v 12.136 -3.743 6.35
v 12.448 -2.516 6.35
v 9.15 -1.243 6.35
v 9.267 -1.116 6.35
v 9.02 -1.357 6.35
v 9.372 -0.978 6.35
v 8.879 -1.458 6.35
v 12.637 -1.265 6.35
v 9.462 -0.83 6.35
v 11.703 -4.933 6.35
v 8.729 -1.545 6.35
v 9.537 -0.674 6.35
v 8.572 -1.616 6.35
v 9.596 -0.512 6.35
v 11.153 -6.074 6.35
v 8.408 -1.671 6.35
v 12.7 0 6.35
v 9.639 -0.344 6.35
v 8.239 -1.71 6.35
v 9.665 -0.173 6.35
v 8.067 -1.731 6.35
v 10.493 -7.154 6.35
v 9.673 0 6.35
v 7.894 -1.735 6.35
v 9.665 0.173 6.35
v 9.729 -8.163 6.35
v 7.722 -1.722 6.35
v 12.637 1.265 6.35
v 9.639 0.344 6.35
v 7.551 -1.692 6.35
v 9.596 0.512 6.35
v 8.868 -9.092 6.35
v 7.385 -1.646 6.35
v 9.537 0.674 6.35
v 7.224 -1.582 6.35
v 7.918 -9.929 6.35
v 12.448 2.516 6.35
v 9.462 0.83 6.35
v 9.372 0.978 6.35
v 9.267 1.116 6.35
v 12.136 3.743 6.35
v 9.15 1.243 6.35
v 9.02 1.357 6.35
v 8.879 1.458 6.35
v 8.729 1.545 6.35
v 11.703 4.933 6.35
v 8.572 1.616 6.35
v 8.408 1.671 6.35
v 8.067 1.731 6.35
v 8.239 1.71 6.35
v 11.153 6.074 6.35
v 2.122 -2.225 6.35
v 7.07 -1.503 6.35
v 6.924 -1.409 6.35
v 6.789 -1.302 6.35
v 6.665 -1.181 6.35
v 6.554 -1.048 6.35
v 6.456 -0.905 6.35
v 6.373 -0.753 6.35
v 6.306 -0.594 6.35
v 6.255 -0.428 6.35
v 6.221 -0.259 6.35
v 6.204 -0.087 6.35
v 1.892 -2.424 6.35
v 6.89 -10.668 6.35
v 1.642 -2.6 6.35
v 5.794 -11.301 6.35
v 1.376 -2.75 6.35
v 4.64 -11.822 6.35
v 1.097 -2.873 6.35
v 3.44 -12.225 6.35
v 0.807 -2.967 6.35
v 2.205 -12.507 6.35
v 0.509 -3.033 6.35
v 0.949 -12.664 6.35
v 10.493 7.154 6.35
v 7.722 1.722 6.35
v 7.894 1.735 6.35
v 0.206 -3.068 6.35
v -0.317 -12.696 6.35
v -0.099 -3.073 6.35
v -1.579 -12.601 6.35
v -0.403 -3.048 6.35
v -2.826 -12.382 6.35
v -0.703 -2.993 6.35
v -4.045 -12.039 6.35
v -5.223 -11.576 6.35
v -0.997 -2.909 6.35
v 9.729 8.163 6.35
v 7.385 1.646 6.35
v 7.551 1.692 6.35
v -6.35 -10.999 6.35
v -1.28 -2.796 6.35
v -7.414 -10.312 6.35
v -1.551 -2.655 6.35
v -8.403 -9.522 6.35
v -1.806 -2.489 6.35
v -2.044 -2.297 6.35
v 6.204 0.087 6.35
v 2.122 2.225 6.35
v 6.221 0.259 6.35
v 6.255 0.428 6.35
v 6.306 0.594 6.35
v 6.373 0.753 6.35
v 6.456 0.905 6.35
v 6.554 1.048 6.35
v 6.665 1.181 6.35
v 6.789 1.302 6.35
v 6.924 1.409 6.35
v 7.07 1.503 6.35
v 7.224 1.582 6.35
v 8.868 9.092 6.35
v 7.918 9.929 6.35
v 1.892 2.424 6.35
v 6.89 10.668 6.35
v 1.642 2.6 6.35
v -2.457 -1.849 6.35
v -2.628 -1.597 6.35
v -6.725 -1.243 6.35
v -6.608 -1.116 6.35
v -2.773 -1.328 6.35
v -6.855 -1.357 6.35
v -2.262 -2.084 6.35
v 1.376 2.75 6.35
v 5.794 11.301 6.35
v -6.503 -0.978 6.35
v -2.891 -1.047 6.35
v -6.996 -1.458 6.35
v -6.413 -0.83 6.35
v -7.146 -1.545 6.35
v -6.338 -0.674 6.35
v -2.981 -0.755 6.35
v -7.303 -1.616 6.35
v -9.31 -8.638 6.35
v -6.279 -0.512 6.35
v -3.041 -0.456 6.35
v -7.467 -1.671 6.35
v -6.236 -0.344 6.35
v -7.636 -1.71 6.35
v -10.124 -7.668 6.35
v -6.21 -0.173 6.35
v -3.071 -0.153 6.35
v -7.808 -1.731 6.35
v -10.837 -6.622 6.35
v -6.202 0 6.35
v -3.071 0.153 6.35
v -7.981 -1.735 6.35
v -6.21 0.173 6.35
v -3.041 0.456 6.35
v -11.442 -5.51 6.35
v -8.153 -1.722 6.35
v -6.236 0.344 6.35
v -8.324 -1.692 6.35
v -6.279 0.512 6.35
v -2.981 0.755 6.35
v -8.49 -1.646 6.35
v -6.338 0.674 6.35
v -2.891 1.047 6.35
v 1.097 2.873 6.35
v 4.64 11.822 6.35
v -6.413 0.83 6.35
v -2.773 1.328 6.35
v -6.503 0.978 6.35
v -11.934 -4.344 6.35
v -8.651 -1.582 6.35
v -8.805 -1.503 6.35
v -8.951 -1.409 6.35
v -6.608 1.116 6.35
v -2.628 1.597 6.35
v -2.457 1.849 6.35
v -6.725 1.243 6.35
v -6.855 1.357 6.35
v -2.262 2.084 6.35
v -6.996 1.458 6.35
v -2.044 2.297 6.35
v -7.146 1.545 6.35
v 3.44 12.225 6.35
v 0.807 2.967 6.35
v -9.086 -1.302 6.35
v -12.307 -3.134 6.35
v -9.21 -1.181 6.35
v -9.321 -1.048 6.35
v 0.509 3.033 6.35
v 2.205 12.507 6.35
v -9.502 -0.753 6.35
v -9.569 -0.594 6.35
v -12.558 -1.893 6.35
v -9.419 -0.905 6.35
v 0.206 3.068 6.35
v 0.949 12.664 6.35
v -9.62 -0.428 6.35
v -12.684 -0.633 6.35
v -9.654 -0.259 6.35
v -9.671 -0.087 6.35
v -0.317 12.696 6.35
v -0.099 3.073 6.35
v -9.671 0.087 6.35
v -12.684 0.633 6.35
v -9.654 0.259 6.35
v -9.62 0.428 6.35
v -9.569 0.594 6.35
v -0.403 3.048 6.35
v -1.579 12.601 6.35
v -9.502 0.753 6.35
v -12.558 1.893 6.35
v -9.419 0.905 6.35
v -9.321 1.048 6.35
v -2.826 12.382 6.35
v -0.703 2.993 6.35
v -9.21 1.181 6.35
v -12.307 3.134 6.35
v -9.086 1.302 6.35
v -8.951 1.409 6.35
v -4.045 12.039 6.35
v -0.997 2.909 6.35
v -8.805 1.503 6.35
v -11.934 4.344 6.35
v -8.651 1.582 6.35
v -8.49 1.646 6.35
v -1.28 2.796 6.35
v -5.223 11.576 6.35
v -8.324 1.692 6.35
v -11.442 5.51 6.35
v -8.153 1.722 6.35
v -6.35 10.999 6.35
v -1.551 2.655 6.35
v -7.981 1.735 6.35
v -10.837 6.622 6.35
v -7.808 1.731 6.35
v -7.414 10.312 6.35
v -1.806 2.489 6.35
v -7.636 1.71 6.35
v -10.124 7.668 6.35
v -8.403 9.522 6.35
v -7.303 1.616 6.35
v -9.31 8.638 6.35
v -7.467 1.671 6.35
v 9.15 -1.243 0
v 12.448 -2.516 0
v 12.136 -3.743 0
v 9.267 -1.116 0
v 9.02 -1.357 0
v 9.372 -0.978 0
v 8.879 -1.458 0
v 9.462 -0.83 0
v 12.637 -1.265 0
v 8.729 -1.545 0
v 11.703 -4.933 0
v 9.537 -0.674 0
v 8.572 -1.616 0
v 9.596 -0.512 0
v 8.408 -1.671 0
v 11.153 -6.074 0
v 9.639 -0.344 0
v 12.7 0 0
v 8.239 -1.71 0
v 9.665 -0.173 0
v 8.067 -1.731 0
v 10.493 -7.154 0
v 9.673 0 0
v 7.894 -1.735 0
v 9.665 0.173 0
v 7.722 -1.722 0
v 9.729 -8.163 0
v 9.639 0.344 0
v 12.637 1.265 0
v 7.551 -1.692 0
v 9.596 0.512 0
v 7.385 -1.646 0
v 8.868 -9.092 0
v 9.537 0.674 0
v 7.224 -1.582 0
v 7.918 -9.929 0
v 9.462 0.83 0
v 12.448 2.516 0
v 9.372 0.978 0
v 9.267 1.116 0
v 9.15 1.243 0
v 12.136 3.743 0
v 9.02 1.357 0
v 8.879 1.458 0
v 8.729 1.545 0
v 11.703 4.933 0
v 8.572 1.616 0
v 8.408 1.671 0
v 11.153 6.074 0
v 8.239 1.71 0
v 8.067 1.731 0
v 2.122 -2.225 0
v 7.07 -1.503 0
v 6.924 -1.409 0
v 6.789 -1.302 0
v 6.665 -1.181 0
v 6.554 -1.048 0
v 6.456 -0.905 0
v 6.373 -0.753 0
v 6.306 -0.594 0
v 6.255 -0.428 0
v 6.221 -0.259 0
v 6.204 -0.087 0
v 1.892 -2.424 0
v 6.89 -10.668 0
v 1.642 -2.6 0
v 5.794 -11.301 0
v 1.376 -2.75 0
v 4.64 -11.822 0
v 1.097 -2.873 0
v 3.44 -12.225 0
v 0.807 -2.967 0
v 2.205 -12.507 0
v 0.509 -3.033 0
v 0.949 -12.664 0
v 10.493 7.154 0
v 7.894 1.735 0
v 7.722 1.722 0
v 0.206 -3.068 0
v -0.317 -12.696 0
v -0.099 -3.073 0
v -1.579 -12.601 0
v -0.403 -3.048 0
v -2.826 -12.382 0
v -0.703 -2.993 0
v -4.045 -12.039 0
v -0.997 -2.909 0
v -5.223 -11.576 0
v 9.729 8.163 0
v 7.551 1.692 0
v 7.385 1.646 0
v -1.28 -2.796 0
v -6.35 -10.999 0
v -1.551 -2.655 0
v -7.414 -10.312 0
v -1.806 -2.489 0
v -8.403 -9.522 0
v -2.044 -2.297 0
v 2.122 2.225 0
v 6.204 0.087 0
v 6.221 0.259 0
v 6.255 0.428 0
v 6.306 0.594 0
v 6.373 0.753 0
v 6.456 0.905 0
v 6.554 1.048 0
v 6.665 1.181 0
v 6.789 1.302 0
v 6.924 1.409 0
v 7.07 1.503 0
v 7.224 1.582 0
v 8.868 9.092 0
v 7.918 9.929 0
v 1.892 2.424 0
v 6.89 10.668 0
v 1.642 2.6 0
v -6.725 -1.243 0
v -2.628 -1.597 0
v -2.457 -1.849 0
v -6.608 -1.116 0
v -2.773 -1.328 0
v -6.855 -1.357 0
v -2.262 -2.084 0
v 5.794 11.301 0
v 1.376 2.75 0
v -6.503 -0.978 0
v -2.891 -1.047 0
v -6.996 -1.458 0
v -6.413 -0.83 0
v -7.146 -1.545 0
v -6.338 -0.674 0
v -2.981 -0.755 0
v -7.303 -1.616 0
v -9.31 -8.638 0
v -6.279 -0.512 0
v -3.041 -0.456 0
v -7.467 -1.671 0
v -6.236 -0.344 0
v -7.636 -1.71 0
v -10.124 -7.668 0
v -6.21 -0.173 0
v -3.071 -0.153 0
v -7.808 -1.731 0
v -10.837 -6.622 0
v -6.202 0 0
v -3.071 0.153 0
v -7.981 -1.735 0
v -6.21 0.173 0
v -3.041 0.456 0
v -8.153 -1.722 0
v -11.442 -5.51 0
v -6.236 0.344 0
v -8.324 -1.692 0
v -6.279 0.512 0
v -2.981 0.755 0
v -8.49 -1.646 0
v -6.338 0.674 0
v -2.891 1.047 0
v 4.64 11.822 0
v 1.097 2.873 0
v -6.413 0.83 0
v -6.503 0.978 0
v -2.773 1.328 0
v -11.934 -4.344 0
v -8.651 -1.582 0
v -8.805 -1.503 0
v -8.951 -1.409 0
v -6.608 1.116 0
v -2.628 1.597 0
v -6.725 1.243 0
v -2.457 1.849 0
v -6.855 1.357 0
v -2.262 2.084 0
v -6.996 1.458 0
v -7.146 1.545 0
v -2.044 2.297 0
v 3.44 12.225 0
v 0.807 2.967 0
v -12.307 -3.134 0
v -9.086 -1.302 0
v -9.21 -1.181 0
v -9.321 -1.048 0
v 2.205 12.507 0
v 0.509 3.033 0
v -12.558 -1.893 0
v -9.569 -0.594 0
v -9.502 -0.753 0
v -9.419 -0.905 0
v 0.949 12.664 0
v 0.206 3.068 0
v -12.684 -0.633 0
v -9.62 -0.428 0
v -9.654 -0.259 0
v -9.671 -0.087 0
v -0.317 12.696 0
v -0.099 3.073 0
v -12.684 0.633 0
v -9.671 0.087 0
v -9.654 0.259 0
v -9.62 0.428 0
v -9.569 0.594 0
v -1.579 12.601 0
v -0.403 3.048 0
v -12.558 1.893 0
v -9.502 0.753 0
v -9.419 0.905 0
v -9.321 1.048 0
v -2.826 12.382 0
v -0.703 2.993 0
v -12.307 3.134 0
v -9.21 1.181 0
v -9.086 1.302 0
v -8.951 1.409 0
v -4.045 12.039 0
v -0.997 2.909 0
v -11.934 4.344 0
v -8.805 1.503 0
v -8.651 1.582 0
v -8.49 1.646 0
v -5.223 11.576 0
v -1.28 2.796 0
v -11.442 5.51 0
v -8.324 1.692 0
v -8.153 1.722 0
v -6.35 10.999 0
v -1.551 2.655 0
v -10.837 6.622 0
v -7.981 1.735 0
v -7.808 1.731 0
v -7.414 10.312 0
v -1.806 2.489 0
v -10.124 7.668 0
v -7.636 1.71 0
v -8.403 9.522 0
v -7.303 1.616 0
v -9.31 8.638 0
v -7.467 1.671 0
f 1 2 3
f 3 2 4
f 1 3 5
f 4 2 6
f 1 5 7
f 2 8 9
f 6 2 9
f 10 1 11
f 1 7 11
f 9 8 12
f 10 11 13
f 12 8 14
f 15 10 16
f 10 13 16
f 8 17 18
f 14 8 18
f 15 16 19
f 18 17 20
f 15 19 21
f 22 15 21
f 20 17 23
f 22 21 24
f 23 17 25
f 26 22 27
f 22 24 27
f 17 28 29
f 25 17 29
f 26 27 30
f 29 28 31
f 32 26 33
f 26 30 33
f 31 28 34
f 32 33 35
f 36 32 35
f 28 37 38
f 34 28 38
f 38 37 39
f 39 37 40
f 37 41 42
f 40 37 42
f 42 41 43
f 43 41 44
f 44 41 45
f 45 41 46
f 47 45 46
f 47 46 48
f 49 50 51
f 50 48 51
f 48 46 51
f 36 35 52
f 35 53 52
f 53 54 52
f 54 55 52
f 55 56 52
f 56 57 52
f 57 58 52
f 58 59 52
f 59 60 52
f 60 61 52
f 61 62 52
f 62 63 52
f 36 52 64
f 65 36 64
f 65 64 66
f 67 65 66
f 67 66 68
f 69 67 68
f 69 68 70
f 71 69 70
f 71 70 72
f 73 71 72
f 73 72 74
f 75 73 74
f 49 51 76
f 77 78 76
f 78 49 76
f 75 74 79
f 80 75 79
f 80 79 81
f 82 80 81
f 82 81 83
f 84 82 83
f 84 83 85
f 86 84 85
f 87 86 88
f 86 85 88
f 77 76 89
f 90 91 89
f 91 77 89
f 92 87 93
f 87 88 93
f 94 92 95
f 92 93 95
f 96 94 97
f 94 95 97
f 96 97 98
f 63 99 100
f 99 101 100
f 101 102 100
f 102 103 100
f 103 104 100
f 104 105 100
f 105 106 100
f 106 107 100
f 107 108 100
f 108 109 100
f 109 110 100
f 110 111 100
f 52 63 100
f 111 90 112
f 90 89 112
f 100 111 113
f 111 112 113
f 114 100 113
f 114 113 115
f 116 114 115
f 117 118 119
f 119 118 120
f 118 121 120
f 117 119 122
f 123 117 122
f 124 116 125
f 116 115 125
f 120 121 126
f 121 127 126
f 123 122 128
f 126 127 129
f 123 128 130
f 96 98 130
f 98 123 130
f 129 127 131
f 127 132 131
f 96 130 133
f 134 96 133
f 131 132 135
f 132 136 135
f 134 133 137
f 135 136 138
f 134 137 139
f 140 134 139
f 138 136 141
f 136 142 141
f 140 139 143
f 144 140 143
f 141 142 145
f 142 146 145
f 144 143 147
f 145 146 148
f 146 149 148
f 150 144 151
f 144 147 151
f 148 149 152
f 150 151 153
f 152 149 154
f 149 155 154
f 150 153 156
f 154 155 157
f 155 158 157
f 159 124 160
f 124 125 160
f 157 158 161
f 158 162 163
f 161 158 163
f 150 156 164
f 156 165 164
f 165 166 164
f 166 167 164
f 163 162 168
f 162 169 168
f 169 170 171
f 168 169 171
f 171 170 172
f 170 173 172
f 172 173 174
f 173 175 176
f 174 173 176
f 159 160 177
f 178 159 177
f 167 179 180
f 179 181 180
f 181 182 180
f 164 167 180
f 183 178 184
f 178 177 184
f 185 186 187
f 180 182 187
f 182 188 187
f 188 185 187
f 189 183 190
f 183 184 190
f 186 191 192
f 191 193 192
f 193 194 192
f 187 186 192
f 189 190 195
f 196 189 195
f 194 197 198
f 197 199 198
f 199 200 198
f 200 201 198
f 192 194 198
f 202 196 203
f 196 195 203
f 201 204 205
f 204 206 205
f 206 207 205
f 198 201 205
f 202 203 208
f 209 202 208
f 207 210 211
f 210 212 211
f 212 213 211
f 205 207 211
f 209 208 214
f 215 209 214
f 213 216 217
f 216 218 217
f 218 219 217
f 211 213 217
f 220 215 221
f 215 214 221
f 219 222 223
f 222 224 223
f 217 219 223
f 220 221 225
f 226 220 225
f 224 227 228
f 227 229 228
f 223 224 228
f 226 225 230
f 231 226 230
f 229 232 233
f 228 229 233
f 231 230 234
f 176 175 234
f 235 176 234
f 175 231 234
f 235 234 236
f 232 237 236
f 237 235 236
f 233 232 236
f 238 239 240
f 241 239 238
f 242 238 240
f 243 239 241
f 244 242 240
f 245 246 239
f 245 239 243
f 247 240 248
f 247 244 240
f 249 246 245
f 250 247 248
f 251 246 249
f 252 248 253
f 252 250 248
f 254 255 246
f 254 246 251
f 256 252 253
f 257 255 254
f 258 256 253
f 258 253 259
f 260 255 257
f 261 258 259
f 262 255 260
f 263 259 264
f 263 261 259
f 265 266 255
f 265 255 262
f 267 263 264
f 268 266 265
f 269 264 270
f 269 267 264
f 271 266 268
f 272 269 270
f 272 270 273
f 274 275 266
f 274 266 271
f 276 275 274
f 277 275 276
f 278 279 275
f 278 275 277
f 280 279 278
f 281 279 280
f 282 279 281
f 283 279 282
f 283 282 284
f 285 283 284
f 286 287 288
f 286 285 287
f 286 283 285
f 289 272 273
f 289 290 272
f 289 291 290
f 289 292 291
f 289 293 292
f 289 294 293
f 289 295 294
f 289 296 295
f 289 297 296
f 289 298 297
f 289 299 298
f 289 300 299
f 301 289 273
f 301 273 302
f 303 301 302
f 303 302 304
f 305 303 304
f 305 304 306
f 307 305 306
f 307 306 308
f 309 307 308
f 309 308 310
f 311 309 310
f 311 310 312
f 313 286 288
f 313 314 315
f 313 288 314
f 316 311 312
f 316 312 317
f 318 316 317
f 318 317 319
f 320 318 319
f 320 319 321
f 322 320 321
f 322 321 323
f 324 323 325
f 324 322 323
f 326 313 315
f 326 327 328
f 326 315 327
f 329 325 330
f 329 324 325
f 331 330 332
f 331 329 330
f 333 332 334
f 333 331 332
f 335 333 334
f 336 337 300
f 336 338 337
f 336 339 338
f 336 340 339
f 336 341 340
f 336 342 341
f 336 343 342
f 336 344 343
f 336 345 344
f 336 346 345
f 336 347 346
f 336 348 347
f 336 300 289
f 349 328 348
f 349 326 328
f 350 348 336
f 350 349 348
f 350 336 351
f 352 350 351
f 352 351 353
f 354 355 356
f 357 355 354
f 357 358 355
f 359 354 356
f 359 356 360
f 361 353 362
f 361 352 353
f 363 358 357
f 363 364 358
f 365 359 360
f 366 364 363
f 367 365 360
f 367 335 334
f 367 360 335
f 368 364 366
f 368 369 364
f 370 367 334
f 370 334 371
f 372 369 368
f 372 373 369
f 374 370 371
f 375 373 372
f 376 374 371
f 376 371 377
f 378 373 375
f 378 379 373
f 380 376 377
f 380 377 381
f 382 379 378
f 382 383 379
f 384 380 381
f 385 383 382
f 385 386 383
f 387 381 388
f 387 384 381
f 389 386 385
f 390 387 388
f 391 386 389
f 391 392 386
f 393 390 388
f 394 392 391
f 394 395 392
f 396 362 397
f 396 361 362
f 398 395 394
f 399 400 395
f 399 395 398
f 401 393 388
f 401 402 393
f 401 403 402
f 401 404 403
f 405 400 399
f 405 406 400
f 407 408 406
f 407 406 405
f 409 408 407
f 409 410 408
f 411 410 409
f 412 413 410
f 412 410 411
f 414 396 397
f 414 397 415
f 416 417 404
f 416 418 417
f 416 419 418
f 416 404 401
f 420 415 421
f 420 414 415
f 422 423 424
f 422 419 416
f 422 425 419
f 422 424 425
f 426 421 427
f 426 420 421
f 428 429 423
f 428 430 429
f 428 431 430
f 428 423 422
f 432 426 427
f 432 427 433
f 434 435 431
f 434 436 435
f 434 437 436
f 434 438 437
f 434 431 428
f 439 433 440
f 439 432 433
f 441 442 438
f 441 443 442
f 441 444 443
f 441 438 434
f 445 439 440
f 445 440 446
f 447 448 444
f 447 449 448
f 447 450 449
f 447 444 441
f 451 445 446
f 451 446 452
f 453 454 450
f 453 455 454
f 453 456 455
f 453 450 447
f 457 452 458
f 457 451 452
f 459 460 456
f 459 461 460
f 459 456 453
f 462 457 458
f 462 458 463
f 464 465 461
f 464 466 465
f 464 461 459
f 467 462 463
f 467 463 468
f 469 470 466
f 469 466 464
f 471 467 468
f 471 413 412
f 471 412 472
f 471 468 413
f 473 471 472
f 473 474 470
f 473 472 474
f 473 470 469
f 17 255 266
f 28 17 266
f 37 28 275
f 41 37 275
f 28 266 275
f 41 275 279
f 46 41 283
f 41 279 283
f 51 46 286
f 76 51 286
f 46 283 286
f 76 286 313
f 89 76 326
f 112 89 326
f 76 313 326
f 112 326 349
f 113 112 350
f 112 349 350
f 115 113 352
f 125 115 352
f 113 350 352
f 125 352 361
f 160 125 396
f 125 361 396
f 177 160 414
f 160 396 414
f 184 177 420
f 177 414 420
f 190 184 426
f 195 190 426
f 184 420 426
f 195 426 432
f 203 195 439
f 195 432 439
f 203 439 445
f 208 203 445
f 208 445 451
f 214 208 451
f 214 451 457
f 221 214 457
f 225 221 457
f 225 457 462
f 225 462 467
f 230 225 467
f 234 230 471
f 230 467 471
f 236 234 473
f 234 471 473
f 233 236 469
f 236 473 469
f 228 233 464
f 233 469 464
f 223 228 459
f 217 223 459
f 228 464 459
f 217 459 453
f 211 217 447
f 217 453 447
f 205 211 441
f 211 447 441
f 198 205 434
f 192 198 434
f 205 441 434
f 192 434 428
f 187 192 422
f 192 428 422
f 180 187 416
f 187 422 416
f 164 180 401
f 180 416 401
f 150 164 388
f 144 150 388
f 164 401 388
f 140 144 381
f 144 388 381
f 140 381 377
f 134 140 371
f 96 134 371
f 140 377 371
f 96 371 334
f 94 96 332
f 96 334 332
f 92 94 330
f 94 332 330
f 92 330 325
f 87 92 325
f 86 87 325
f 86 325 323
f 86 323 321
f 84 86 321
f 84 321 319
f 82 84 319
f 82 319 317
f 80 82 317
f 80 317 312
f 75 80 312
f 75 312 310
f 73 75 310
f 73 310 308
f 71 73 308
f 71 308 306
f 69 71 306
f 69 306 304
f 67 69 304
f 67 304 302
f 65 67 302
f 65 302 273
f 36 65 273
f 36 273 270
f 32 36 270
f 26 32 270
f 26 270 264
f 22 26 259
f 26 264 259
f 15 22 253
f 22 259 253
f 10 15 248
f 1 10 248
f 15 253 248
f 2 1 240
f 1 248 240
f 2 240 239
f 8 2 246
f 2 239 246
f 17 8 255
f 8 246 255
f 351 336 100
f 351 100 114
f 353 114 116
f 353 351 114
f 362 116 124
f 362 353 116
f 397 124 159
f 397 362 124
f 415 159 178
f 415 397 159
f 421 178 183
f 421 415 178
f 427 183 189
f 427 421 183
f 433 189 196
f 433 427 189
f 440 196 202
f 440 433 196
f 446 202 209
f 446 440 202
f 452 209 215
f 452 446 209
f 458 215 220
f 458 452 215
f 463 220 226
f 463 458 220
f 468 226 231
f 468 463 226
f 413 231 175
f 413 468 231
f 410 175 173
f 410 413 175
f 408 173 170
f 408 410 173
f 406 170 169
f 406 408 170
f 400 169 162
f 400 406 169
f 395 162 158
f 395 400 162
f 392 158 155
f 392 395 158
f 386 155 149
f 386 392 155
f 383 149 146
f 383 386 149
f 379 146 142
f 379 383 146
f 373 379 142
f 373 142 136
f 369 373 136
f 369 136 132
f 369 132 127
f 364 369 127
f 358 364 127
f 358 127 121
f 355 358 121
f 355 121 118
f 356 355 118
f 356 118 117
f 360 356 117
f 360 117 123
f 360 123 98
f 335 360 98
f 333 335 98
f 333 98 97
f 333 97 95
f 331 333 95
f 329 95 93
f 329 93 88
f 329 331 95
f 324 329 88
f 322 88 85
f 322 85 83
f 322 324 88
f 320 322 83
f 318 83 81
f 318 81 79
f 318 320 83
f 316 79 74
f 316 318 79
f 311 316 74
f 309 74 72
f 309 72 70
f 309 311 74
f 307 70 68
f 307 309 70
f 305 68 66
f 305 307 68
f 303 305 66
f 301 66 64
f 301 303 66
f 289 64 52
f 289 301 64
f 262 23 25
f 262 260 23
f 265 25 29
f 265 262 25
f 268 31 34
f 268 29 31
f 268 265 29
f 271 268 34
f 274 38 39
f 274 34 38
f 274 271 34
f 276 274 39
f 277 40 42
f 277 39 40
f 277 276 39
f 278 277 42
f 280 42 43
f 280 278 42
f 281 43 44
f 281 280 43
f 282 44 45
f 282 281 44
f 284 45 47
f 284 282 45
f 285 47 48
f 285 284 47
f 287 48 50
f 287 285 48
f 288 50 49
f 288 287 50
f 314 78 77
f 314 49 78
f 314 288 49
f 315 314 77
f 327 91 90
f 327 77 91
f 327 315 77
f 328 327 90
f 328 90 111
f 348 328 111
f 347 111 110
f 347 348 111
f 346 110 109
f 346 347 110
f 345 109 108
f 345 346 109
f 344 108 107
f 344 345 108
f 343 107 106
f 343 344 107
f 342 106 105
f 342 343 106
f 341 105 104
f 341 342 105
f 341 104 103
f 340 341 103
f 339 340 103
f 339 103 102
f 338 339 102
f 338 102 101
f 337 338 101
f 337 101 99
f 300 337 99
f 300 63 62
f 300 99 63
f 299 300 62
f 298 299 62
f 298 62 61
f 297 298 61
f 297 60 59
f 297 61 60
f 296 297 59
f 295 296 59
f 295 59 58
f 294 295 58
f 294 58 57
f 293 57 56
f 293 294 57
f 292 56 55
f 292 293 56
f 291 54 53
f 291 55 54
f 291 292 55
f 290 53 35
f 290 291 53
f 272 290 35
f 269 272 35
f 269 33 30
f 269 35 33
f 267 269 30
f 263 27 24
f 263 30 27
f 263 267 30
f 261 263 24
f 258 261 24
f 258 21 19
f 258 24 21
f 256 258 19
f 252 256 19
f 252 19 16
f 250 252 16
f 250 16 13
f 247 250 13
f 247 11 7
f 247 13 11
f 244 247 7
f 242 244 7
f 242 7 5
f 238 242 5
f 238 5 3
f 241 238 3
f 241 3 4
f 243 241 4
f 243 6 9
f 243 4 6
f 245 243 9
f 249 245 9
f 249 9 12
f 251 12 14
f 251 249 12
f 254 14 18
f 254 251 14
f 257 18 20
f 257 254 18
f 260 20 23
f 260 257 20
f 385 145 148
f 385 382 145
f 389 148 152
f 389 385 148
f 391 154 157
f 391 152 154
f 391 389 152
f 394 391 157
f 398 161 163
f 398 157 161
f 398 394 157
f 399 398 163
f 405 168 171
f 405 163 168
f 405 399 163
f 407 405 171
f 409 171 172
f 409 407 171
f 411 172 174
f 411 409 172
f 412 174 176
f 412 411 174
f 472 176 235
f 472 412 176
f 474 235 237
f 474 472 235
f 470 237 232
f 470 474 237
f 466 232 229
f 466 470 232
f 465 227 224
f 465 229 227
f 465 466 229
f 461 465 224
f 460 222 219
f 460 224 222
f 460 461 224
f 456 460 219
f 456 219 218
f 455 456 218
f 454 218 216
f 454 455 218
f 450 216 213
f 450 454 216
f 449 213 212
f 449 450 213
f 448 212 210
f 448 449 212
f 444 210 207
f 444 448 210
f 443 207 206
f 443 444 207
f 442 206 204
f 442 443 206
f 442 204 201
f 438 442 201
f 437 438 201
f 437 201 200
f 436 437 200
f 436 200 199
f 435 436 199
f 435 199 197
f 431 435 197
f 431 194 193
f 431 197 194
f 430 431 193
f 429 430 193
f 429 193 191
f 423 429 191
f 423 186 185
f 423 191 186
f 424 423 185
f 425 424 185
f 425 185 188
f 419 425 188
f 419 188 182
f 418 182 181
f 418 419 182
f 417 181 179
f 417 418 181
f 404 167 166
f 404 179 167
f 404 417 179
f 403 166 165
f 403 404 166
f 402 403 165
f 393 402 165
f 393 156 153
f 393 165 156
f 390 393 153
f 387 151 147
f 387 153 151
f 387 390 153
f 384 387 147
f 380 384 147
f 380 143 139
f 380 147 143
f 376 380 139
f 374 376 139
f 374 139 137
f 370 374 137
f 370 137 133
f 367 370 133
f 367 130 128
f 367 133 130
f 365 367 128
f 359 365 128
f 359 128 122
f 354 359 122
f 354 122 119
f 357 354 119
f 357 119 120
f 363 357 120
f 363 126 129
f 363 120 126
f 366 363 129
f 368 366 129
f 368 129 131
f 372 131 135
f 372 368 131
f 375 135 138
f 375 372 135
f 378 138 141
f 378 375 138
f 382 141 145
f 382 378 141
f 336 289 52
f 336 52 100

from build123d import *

# Parameters (mm, degrees)
SKETCH1_R               = 12.7
BOSS_EXTRUDE1_DEPTH     = 6.35
CUT_EXTRUDE1_DEPTH      = 20.05
CUT_EXTRUDE1_DEPTH_BACK = 20.05
SKETCH2_R               = 1.7359375


with BuildPart() as part:
    # Sketch1 → Boss-Extrude1 (new body)
    # profile 1 of 2: a face of its own
    with BuildSketch(Plane.XY):
        Circle(SKETCH1_R)
        with BuildLine():
            ThreePointArc((2.2225, 2.267403526), (-3.175, 0), (2.2225, -2.267403526))
            Line((2.2225, -2.267403526), (2.2225, 2.267403526))
        make_face(mode=Mode.SUBTRACT)
    # profile 2 of 2: a face of its own
    with BuildSketch(Plane.XY):
        with BuildLine():
            Line((2.2225, 2.267403526), (2.2225, -2.267403526))
            ThreePointArc((2.2225, -2.267403526), (-3.175, 0), (2.2225, 2.267403526))
        make_face()
        with BuildLine():
            ThreePointArc((2.1225, 2.224998596), (-3.075, 0), (2.1225, -2.224998596))
            Line((2.1225, -2.224998596), (2.1225, 2.224998596))
        make_face(mode=Mode.SUBTRACT)
    extrude(amount=BOSS_EXTRUDE1_DEPTH)

    # Sketch2 → Cut-Extrude1 (cut, two sides: drawn at the far end of the back side and taken through both)
    with BuildSketch(Plane.XY.offset(6.35).offset(-CUT_EXTRUDE1_DEPTH_BACK)):
        with Locations((7.9375, 0)):
            Circle(SKETCH2_R)
        with Locations((-7.9375, 0)):
            Circle(SKETCH2_R)
    extrude(amount=CUT_EXTRUDE1_DEPTH + CUT_EXTRUDE1_DEPTH_BACK, mode=Mode.SUBTRACT)


solid = part.part
